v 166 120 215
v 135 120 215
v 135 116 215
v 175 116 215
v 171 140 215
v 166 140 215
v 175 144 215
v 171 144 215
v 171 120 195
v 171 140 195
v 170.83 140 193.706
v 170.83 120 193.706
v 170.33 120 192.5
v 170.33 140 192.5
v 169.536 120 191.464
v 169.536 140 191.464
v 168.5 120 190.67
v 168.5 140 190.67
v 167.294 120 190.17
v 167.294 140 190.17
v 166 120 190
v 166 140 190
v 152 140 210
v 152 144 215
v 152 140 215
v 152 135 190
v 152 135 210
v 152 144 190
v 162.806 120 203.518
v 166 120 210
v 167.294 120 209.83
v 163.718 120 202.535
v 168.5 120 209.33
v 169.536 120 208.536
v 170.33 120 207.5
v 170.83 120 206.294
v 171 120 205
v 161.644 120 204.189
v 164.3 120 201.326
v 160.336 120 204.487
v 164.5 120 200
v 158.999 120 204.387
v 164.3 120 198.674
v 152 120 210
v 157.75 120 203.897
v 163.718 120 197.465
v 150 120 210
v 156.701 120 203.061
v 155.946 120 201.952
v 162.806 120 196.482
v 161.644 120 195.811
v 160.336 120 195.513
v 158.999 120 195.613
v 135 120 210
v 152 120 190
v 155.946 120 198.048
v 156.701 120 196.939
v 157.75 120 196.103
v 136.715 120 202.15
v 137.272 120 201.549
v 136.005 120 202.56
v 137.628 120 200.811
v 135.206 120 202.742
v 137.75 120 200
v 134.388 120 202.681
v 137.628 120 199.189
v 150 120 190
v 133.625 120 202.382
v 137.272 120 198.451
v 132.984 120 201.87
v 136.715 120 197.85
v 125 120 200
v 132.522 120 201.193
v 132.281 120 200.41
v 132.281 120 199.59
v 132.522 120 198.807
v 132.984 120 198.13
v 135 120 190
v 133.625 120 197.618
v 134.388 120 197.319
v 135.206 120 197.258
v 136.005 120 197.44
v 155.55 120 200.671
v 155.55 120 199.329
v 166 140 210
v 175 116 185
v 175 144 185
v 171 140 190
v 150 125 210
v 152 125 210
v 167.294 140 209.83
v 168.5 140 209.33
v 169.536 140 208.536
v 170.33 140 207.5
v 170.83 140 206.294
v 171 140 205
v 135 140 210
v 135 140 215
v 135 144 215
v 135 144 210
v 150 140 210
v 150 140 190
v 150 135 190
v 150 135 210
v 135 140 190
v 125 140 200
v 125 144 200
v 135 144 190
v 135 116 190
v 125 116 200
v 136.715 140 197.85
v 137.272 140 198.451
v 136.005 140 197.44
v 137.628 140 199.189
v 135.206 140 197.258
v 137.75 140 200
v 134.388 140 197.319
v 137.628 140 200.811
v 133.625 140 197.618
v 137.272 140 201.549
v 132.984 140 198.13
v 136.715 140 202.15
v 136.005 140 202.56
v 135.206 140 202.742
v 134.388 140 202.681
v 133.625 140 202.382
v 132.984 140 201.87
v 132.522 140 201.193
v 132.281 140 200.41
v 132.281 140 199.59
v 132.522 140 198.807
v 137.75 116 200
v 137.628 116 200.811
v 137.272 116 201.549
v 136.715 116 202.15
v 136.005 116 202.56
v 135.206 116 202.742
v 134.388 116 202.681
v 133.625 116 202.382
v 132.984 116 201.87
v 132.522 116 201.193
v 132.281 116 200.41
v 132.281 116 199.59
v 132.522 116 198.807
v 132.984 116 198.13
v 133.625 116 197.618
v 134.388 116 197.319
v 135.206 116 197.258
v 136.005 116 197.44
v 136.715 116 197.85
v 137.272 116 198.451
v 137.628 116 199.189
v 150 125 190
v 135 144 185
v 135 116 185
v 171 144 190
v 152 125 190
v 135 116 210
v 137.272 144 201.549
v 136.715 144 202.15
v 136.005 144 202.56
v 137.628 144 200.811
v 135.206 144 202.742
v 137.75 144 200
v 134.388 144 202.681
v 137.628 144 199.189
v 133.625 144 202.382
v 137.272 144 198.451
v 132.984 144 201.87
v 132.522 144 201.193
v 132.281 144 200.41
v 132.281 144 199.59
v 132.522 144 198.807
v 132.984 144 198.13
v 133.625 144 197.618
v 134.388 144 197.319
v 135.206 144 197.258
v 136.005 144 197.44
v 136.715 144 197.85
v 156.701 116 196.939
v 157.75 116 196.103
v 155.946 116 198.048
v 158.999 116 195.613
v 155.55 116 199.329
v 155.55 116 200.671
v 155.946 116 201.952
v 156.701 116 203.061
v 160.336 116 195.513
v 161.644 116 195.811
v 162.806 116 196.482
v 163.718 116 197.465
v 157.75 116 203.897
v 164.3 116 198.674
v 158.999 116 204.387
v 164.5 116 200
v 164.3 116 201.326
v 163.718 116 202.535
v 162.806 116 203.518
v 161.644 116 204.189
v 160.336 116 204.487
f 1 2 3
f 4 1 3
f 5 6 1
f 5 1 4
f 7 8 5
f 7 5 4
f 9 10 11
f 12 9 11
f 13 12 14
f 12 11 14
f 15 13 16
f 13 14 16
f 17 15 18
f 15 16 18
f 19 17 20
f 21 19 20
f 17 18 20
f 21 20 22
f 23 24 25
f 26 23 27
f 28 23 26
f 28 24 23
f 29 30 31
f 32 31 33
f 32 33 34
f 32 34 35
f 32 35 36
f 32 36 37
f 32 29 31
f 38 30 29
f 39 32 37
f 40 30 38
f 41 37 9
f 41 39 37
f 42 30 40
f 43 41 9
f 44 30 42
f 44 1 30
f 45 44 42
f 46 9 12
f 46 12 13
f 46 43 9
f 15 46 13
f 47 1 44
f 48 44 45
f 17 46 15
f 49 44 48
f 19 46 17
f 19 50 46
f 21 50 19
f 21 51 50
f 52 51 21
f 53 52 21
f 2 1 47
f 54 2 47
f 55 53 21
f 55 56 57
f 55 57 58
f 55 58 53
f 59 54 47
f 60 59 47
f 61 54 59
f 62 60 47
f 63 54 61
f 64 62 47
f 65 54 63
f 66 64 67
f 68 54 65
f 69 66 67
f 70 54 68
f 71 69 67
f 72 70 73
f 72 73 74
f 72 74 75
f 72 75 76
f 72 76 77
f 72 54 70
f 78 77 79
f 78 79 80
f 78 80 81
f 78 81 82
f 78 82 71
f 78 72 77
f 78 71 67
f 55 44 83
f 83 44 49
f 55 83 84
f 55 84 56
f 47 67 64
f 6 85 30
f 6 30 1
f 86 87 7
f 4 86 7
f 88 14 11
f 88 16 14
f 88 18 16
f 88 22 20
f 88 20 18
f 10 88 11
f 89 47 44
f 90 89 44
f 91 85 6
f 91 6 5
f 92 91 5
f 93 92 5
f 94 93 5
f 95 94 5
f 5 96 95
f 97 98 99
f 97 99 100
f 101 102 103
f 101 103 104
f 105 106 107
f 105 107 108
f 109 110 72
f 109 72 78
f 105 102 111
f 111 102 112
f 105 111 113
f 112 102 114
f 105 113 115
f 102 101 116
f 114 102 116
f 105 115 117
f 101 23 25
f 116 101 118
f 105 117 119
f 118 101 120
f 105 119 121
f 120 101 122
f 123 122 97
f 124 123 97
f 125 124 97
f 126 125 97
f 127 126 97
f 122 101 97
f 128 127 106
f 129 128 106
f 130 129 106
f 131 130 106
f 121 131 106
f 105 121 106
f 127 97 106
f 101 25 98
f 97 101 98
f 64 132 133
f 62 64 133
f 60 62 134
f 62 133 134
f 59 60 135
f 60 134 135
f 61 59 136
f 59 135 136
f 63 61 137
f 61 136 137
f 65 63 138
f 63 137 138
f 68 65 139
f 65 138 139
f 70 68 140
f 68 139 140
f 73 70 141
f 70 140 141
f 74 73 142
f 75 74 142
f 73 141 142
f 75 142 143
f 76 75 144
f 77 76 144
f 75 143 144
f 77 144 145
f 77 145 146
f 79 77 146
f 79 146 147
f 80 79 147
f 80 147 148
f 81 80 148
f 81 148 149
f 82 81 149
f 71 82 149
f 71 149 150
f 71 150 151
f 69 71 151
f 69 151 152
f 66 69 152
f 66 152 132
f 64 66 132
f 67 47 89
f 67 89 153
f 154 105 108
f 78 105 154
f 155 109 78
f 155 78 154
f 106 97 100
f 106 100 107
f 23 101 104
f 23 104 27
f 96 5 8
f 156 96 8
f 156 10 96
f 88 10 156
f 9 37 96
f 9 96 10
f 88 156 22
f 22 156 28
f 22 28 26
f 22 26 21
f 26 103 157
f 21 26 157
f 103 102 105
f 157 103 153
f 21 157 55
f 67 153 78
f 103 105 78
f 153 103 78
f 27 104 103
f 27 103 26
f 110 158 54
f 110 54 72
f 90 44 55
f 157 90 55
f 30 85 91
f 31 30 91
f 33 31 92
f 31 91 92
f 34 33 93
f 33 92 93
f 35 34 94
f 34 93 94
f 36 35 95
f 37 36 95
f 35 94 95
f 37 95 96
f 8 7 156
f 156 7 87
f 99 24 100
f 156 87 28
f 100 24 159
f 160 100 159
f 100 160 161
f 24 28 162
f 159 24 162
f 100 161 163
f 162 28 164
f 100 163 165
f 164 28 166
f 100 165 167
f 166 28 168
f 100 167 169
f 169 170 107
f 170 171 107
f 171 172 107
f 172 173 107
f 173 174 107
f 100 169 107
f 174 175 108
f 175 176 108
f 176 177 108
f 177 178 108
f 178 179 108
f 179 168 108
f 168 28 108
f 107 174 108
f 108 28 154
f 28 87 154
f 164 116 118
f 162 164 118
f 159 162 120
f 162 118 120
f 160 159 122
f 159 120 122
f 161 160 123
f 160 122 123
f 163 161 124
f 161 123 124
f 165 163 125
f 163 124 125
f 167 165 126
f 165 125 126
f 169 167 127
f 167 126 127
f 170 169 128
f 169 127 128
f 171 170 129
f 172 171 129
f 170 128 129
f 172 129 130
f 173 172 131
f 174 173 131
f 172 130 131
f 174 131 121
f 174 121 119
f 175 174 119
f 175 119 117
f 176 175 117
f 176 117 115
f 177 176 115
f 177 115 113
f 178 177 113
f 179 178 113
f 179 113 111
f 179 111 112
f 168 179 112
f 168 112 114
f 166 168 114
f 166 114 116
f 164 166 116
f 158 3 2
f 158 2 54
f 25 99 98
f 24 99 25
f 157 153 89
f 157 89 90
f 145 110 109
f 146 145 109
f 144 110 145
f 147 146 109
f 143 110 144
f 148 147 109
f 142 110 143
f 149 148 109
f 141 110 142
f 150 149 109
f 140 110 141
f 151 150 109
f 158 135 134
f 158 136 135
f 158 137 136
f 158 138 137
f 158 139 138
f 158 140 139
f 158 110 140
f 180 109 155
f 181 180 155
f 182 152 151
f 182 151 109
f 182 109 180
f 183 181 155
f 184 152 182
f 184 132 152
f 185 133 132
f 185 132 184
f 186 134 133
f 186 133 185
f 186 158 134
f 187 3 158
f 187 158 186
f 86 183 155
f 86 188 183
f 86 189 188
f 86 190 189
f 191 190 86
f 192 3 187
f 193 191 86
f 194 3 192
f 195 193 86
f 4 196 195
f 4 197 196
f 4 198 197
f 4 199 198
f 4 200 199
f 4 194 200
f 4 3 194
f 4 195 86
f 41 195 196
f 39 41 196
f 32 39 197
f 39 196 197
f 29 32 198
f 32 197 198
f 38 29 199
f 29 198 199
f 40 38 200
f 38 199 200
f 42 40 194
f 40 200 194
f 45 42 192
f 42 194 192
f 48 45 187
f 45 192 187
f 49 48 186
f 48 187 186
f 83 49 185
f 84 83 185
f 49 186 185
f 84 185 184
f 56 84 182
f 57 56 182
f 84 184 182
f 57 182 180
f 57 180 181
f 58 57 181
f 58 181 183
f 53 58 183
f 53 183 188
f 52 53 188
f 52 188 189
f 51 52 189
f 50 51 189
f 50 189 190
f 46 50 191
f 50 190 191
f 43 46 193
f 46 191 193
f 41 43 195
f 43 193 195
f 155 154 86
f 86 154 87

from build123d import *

# Parameters (mm, degrees)
SKETCH058_W     = 50
SKETCH058_H     = 30
PAD015_DEPTH    = 28
SKETCH059_R     = 4.5
HOLE009_DEPTH   = 4
HOLE009_TIPS_R  = 4.5
SKETCH060_W     = 20
SKETCH060_H     = 20
POCKET021_DEPTH = 46
POCKET022_DEPTH = 28.001
SKETCH062_R     = 2.75
HOLE010_DEPTH   = 28.001
SKETCH063_W     = 42
SKETCH063_H     = 20
POCKET023_DEPTH = 25
SKETCH064_W     = 2
SKETCH064_H     = 20
PAD016_DEPTH    = 5
PAD017_DEPTH    = 24
SKETCH066_W     = 5
SKETCH066_H     = 5
PAD018_DEPTH    = 20
SKETCH067_W     = 19
SKETCH067_H     = 25
POCKET024_DEPTH = 4
SKETCH068_W     = 2
SKETCH068_H     = 20
PAD019_DEPTH    = 5


with BuildPart() as part:
    # Sketch058 → Pad015 (new body)
    with BuildSketch(Plane.XZ.offset(-144)):
        with Locations((150, 200)):
            Rectangle(SKETCH058_W, SKETCH058_H)
    extrude(amount=PAD015_DEPTH)

    # Sketch059 (on Face6 of Pad015) → Hole009 (cut)
    with BuildSketch(Plane.XZ.offset(-116)):
        with Locations((160, 200)):
            Circle(SKETCH059_R)
    extrude(amount=-HOLE009_DEPTH, mode=Mode.SUBTRACT)

    # Hole009 tips → Hole009 tip 1 section 0
    with BuildSketch(Plane.XZ.offset(-120), mode=Mode.PRIVATE) as hole009_tip_1_s0:
        with Locations((160, 200)):
            Circle(HOLE009_TIPS_R)
    loft([hole009_tip_1_s0.sketch, Vertex(160, 122.703873, 200)], mode=Mode.SUBTRACT)

    # Sketch060 (on Face2 of Hole009) → Pocket021 (cut)
    with BuildSketch(Plane(origin=(125, 0, 0), x_dir=(0, 0, -1), z_dir=(-1, 0, 0))):
        with Locations((-200, -130)):
            Rectangle(SKETCH060_W, SKETCH060_H)
    extrude(amount=-POCKET021_DEPTH, mode=Mode.SUBTRACT)

    # Sketch061 (on Face5 of Pocket021) → Pocket022 (cut, through all)
    with BuildSketch(Plane.XZ.offset(-116)):
        Polygon((125, 200), (135, 190), (135, 185), (125, 185), (125, 215), (135, 215), (135, 210), align=None)
    extrude(amount=-POCKET022_DEPTH, mode=Mode.SUBTRACT)

    # Sketch062 (on Face4 of Pocket022) → Hole010 (cut, through all)
    with BuildSketch(Plane.XZ.offset(-116)):
        with Locations((135, 200)):
            Circle(SKETCH062_R)
    extrude(amount=-HOLE010_DEPTH, mode=Mode.SUBTRACT)

    # Sketch063 (on Face7 of Hole010) → Pocket023 (cut)
    with BuildSketch(Plane(origin=(0, 0, 215), x_dir=(-1, 0, 0), z_dir=(0, 0, 1))):
        with Locations((-150, -130)):
            Rectangle(SKETCH063_W, SKETCH063_H)
    extrude(amount=-POCKET023_DEPTH, mode=Mode.SUBTRACT)

    # Sketch064 (on Face23 of Pocket023) → Pad016 (join)
    with BuildSketch(Plane(origin=(0, 120, 0), x_dir=(1, 0, 0), z_dir=(0, 1, 0))):
        with Locations((151, -200)):
            Rectangle(SKETCH064_W, SKETCH064_H)
    extrude(amount=PAD016_DEPTH)

    # Sketch065 (on Face2 of Pocket023) → Pad017 (join)
    with BuildSketch(Plane(origin=(0, 144, 0), x_dir=(1, 0, 0), z_dir=(0, 1, 0))):
        with BuildLine():
            Line((166, -190), (171, -190))
            Line((171, -190), (171, -195))
            ThreePointArc((171, -195), (169.535534, -191.464466), (166, -190))
        make_face()
        with BuildLine():
            Line((166, -210), (171, -210))
            Line((171, -210), (171, -205))
            ThreePointArc((166, -210), (169.535534, -208.535534), (171, -205))
        make_face()
    extrude(amount=-PAD017_DEPTH)

    # Sketch066 (on Face21 of Pad017) → Pad018 (join)
    with BuildSketch(Plane.XZ.offset(-140)):
        with Locations((168.5, 212.5)):
            Rectangle(SKETCH066_W, SKETCH066_H)
    extrude(amount=PAD018_DEPTH)

    # Sketch067 (on Face2 of Pad018) → Pocket024 (cut)
    with BuildSketch(Plane(origin=(0, 144, 0), x_dir=(1, 0, 0), z_dir=(0, 1, 0))):
        with Locations((161.5, -202.5)):
            Rectangle(SKETCH067_W, SKETCH067_H)
    extrude(amount=-POCKET024_DEPTH, mode=Mode.SUBTRACT)

    # Sketch068 (on Face26 of Pocket024) → Pad019 (join)
    with BuildSketch(Plane.XZ.offset(-140)):
        with Locations((151, 200)):
            Rectangle(SKETCH068_W, SKETCH068_H)
    extrude(amount=PAD019_DEPTH)


solid = part.part
